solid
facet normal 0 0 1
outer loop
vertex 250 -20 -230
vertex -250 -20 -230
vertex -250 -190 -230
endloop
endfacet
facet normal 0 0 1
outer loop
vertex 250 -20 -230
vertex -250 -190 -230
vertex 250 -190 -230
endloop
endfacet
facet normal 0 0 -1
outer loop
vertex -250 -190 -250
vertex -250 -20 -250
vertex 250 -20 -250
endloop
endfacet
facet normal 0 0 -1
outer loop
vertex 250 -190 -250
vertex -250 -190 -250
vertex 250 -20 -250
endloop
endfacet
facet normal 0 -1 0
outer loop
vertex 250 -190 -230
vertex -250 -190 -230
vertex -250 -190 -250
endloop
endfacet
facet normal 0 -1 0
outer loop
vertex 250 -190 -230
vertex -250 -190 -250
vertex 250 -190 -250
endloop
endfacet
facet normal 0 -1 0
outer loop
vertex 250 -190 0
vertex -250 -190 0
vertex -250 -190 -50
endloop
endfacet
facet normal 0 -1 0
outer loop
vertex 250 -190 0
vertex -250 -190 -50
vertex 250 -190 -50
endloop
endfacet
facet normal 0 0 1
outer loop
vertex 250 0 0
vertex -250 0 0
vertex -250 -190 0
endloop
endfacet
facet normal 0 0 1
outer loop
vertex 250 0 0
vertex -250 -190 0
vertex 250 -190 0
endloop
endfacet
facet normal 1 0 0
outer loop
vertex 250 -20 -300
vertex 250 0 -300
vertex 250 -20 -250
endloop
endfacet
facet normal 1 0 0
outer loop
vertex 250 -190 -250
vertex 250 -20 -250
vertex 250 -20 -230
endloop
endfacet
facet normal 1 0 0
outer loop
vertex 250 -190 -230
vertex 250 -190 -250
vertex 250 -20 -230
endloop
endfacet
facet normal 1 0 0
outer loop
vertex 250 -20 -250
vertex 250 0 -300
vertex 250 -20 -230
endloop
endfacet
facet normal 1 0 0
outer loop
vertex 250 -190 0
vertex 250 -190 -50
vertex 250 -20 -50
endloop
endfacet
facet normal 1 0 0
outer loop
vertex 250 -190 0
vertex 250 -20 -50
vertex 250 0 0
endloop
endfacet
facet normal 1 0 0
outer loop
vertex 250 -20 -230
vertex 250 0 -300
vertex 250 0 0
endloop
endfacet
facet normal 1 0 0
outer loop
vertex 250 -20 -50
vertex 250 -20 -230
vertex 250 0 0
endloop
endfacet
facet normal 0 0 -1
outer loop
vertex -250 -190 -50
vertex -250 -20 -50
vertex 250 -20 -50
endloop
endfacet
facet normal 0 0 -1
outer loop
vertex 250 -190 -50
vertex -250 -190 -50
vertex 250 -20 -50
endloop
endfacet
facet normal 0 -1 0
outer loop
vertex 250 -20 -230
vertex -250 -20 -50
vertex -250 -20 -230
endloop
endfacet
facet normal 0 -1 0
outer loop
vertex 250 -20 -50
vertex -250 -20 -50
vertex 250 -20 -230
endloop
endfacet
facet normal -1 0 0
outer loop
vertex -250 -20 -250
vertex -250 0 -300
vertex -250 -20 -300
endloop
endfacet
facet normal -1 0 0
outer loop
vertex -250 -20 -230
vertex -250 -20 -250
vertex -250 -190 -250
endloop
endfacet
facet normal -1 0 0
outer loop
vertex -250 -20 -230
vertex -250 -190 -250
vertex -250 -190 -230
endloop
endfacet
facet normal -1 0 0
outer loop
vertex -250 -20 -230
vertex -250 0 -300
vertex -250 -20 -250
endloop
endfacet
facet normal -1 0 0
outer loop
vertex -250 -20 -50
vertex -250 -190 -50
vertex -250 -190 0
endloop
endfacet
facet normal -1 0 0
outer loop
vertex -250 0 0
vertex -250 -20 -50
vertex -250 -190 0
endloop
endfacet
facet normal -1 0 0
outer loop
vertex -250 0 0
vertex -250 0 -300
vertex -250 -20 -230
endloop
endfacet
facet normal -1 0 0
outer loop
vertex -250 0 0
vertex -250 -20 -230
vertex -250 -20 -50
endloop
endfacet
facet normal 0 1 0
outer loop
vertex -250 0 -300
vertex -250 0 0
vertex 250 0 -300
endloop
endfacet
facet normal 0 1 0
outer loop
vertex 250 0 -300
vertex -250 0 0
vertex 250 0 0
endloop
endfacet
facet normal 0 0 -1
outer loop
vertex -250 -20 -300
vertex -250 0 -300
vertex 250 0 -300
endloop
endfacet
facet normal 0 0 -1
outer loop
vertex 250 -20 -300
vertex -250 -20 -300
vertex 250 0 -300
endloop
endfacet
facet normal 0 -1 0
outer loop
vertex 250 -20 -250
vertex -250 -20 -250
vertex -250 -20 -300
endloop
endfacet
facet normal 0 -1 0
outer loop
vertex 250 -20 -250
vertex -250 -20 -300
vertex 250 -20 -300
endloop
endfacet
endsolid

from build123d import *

# Parameters (mm, degrees)
F0_W     = 500
F0_H     = 190
F1_DEPTH = 50
F2_W     = 500
F2_H     = 300
F3_DEPTH = 20
F4_W     = 500
F4_H     = 20
F5_DEPTH = 170


# Not quite as in the source:
# - the program builds the solid bodies; features that only make, move or delete a surface that nothing else refers to are left out


with BuildPart() as f1:
    # F0 (on Top) → F1 (new body)
    with BuildSketch(Plane.XY):
        with Locations((0, -95)):
            Rectangle(F0_W, F0_H)
    extrude(amount=-F1_DEPTH)

    # F2 (on Front) → F3 (join)
    with BuildSketch(Plane.XZ):
        with Locations((0, -150)):
            Rectangle(F2_W, F2_H)
    extrude(amount=F3_DEPTH)

    # F4 (on face) → F5 (join)
    with BuildSketch(Plane.XZ.offset(20)):
        with Locations((0, -240)):
            Rectangle(F4_W, F4_H)
    extrude(amount=F5_DEPTH)


solid = f1.part
